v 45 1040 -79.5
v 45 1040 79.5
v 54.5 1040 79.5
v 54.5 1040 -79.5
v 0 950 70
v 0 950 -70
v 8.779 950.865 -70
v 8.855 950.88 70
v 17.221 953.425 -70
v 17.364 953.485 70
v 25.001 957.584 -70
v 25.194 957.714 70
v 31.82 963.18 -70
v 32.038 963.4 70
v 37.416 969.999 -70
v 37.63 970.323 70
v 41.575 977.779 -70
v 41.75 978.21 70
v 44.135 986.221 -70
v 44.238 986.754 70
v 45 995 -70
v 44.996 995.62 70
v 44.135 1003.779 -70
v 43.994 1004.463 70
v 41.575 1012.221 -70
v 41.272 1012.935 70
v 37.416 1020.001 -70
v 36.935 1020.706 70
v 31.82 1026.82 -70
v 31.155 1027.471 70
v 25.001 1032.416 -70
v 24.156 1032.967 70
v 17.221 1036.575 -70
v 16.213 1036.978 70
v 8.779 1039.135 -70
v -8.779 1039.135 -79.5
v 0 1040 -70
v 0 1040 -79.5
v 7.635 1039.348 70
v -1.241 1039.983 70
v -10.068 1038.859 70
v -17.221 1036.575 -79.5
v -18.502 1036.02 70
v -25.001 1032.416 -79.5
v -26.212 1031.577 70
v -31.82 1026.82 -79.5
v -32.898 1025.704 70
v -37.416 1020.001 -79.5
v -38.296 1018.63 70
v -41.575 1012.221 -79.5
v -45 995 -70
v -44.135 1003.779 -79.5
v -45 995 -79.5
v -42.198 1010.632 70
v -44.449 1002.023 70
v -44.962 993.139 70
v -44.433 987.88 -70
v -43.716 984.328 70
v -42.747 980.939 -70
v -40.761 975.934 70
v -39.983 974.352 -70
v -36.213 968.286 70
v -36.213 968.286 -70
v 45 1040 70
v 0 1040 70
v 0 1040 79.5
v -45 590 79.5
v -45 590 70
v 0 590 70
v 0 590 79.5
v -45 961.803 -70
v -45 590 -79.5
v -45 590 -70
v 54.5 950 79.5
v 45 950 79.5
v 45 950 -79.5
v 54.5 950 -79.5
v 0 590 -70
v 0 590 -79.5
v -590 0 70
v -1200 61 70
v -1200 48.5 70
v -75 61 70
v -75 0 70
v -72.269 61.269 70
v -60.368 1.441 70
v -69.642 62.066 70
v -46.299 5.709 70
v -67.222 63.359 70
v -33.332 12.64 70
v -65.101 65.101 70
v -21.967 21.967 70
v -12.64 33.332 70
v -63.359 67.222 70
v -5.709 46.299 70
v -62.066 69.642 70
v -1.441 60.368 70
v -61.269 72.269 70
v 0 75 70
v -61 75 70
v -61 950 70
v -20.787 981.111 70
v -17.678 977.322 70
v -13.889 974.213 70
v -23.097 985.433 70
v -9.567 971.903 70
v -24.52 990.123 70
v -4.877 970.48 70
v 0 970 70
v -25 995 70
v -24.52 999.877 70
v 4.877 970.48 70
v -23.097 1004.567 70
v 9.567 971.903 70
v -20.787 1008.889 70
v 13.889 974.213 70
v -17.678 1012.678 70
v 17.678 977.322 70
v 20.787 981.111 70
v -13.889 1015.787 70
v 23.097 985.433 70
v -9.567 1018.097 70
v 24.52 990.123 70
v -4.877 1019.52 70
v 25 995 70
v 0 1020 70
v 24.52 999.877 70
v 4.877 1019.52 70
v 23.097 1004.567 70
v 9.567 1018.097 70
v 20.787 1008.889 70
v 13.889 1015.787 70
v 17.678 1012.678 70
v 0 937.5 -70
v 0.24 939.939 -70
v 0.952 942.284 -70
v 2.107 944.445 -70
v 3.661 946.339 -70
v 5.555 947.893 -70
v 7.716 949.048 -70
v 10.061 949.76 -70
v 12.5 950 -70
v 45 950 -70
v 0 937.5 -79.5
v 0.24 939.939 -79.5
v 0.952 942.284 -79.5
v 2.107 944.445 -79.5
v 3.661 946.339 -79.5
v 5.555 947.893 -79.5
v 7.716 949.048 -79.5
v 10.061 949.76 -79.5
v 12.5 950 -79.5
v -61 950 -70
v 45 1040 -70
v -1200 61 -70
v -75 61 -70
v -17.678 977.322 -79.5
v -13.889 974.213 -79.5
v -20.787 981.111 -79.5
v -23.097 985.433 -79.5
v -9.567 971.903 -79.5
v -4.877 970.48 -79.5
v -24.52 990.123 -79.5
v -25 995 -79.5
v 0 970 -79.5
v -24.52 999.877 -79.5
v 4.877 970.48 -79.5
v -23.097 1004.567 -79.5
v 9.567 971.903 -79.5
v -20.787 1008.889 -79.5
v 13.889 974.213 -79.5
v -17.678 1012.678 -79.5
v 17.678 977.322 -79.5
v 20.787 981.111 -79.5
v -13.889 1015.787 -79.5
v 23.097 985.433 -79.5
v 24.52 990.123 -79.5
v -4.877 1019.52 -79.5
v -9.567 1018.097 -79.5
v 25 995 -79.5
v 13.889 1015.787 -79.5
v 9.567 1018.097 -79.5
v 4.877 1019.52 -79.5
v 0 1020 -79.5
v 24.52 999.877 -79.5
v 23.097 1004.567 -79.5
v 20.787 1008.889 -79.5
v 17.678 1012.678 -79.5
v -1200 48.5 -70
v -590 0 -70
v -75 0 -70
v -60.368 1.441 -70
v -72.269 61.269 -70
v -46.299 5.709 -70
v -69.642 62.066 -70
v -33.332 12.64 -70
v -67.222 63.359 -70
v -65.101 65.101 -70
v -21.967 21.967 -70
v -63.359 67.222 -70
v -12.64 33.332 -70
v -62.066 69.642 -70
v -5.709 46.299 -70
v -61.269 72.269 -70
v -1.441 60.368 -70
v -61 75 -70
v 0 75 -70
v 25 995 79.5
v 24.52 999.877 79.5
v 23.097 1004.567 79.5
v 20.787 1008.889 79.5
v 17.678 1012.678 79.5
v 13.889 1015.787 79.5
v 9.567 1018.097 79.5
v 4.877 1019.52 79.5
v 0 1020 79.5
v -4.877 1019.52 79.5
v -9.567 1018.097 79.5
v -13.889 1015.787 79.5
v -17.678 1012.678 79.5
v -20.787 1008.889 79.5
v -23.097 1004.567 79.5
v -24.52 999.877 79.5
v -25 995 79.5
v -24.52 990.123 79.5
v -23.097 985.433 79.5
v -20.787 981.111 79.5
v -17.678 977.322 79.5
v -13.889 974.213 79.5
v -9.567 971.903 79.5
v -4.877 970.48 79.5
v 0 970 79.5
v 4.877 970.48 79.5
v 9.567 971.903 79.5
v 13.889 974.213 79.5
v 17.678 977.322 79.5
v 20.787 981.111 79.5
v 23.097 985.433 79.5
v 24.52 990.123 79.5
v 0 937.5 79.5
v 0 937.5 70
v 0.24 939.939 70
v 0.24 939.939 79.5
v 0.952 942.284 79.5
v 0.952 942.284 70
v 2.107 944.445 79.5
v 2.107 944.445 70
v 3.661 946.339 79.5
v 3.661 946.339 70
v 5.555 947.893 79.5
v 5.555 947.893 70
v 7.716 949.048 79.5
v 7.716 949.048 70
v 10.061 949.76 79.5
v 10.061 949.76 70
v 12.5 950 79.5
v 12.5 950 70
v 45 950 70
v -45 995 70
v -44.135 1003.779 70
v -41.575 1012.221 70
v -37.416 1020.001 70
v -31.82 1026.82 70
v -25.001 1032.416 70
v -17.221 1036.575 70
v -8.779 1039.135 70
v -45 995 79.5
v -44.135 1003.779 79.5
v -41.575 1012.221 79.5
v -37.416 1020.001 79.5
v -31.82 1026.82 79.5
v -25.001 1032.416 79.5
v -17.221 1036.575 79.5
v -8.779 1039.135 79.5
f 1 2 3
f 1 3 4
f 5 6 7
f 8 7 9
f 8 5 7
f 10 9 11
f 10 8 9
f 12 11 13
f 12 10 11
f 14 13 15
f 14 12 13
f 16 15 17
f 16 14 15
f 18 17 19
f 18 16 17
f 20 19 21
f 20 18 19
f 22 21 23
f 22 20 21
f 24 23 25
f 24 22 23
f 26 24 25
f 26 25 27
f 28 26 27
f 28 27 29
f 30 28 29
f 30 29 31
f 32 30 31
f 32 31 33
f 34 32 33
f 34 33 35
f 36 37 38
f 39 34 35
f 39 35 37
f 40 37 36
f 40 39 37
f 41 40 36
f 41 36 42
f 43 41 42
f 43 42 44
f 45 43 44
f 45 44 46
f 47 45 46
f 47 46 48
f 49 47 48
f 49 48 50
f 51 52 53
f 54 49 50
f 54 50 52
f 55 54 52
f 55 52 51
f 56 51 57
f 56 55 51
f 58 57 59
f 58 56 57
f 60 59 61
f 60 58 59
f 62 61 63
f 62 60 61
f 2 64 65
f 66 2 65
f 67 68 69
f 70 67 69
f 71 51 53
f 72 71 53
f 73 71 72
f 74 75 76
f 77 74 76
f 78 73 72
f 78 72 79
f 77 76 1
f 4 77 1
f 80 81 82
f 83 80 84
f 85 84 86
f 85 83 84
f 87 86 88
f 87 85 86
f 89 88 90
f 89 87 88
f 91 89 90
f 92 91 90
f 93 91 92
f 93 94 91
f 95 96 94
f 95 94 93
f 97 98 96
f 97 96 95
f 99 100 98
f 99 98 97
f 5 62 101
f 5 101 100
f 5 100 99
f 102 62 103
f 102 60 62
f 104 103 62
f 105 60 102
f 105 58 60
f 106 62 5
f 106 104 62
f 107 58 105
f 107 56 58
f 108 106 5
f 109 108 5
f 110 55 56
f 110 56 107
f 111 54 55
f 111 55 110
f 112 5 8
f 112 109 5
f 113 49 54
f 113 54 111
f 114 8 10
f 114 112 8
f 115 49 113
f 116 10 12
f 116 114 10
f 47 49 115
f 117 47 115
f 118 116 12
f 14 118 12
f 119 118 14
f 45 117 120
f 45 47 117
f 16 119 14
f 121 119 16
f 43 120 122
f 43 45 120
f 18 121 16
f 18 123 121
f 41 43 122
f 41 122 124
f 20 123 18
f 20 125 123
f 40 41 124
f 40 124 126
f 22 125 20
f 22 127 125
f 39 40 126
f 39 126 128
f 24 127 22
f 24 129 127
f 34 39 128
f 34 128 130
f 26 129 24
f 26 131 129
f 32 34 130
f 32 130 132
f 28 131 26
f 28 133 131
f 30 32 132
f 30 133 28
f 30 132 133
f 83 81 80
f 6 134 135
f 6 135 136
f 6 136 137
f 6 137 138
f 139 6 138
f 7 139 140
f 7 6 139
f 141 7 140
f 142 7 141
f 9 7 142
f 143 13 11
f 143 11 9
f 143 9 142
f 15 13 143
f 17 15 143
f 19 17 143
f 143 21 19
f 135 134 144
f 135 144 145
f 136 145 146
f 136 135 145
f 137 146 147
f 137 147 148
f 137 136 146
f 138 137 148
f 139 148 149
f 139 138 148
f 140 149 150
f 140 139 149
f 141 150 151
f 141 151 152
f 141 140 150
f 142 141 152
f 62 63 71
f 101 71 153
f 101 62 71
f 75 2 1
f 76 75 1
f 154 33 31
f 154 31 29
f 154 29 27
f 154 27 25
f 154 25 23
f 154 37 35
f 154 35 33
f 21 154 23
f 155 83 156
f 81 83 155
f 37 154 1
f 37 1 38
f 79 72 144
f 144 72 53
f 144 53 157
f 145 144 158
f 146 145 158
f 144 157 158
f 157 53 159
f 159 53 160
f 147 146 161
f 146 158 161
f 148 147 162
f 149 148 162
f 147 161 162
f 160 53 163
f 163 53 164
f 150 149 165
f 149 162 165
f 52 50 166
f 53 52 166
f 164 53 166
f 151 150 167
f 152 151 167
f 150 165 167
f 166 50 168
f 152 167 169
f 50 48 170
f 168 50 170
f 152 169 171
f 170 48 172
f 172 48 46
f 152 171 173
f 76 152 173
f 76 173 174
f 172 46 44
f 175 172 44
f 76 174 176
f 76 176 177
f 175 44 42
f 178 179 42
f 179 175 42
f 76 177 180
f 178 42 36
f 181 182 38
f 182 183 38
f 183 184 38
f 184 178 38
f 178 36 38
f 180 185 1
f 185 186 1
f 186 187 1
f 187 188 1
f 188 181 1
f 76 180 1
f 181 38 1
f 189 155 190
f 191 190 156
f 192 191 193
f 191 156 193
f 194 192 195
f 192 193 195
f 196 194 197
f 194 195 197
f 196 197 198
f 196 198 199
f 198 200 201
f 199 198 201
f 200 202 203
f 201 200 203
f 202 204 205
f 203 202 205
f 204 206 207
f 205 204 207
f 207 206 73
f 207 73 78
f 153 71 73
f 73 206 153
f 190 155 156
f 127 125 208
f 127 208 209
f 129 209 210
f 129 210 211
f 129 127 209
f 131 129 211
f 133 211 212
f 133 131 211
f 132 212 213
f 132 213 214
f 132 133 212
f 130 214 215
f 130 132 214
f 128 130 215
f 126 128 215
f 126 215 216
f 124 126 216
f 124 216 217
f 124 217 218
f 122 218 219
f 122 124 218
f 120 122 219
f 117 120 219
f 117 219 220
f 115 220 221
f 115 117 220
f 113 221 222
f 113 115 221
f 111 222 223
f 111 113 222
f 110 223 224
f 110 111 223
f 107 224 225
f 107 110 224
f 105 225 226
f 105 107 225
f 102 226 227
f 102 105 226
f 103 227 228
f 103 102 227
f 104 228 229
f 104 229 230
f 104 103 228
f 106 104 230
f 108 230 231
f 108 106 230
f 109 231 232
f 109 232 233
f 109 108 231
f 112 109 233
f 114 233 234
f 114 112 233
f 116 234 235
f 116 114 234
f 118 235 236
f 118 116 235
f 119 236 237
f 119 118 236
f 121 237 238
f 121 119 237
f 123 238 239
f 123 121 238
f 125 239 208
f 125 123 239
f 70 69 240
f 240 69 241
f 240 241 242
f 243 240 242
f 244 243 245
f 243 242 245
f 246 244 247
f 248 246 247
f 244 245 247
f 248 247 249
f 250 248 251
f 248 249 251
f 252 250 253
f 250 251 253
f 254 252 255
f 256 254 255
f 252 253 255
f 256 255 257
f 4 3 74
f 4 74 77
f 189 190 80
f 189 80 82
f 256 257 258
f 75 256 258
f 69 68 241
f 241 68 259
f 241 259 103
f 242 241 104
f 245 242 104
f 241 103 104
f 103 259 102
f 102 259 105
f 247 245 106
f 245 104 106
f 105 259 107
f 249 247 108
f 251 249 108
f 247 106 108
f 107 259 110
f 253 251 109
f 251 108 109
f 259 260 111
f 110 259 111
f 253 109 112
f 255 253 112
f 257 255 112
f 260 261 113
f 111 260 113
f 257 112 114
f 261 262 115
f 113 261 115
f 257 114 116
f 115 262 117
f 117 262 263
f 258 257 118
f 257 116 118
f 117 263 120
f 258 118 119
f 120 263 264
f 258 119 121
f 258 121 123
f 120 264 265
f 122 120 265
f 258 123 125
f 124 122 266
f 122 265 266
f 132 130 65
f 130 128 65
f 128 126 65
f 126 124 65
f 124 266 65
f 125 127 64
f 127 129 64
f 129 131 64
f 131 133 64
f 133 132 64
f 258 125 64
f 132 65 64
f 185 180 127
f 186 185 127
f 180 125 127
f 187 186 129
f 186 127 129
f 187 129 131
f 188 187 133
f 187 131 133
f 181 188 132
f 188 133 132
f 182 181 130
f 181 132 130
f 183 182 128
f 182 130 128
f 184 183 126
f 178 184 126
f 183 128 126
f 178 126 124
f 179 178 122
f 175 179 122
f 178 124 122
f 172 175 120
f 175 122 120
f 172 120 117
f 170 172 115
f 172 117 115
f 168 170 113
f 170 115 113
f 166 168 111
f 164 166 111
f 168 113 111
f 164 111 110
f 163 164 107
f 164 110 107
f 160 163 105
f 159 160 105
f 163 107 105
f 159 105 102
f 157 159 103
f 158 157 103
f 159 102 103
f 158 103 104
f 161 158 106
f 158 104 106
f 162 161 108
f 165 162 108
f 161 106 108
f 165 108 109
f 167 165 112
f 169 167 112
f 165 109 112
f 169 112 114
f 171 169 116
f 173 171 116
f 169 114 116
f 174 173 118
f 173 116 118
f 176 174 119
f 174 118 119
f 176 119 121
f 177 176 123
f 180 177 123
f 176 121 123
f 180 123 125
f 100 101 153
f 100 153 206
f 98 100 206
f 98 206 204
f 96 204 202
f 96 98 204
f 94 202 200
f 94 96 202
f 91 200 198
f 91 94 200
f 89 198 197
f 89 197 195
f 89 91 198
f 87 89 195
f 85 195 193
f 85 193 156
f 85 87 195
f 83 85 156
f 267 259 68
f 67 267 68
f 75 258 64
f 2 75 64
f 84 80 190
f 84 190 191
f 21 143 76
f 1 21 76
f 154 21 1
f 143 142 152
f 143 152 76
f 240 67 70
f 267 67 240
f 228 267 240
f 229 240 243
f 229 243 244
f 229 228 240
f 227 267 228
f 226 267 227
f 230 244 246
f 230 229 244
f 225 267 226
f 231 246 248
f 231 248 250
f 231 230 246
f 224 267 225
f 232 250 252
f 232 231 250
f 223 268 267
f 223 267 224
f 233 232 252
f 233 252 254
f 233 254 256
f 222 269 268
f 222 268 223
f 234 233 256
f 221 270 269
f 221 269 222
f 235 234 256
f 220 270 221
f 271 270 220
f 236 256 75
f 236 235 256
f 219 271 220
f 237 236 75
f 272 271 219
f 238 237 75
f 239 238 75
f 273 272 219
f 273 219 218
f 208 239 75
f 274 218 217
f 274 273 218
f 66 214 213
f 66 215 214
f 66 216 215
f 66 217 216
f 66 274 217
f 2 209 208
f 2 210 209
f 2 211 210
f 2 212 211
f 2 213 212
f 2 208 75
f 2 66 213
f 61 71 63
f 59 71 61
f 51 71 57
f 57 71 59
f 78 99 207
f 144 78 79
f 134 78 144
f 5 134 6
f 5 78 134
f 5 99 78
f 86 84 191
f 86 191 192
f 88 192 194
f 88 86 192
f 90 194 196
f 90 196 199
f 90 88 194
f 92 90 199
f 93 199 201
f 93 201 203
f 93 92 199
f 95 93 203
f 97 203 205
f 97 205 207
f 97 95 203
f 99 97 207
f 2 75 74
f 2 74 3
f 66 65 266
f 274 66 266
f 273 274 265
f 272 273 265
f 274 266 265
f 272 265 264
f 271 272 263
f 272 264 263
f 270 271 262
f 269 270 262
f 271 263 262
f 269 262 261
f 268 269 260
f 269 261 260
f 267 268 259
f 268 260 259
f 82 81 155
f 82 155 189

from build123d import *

# Parameters (mm, degrees)
EXTRUDE_THIN1_DEPTH     = 70
CUT_EXTRUDE1_DEPTH      = 1537.912489376
CUT_EXTRUDE1_DEPTH_BACK = 1537.912489376
SKETCH3_R               = 45
SKETCH3_R_2             = 25
BOSS_EXTRUDE1_DEPTH     = 70
BOSS_EXTRUDE2_DEPTH     = 70
SKETCH5_R               = 45
SKETCH5_R_2             = 25
BOSS_EXTRUDE3_DEPTH     = 9.5
SKETCH7_W               = 159
SKETCH7_H               = 90
BOSS_EXTRUDE5_DEPTH     = 9.5


with BuildPart() as part:
    # Sketch1 → Extrude-Thin1 (new, symmetric)
    with BuildSketch(Plane.XY):
        with BuildLine():
            Line((-1200, 0), (-75, 0))
            ThreePointArc((-75, 0), (-21.966991411, 21.966991411), (0, 75))
            Line((0, 75), (0, 950))
            Line((0, 950), (-61, 950))
            Line((-61, 950), (-61, 75))
            ThreePointArc((-61, 75), (-65.100505063, 65.100505063), (-75, 61))
            Line((-75, 61), (-1200, 61))
            Line((-1200, 61), (-1200, 0))
        make_face()
    extrude(amount=EXTRUDE_THIN1_DEPTH, both=True)

    # Sketch2 → Cut-Extrude1 (cut, two sides: drawn at the far end of the back side and taken through both)
    with BuildSketch(Plane.XY.offset(70).offset(-CUT_EXTRUDE1_DEPTH_BACK)):
        Polygon((-4202.326226889, 287.209544269), (-1200, 48.5), (-590, 0), (2412.326226889, -238.709544269), (1934.907138351, -6243.361998046), (-4679.745315427, -5717.442909508), align=None)
    extrude(amount=CUT_EXTRUDE1_DEPTH + CUT_EXTRUDE1_DEPTH_BACK, mode=Mode.SUBTRACT)


with BuildPart() as body_2:
    # Sketch3 → Boss-Extrude1 (new, symmetric)
    with BuildSketch(Plane.XY):
        with Locations((0, 995)):
            Circle(SKETCH3_R)
        with Locations((0, 995)):
            Circle(SKETCH3_R_2, mode=Mode.SUBTRACT)
    extrude(amount=BOSS_EXTRUDE1_DEPTH, both=True)


with BuildPart() as body_3:
    # Sketch4 → Boss-Extrude2 (new, symmetric)
    with BuildSketch(Plane.XY):
        with BuildLine():
            Line((-36.212585863, 968.285797314), (-61, 950))
            Line((-61, 950), (0, 950))
            ThreePointArc((0, 950), (-20.283748164, 954.830738612), (-36.212585863, 968.285797314))
        make_face()
    extrude(amount=BOSS_EXTRUDE2_DEPTH, both=True)


with BuildPart() as body_4:
    # Sketch5 → Boss-Extrude3 (new body)
    # profile 1 of 3: a face of its own
    with BuildSketch(Plane.XY.offset(70)):
        with Locations((0, 995)):
            Circle(SKETCH5_R)
        with Locations((0, 995)):
            Circle(SKETCH5_R_2, mode=Mode.SUBTRACT)
    # profile 2 of 3: a face of its own
    with BuildSketch(Plane.XY.offset(70)):
        with BuildLine():
            Line((45, 1040), (0, 1040))
            ThreePointArc((0, 1040), (31.819805153, 1026.819805153), (45, 995))
            Line((45, 995), (45, 1040))
        make_face()
    # profile 3 of 3: a face of its own
    with BuildSketch(Plane.XY.offset(70)):
        with BuildLine():
            ThreePointArc((45, 995), (0, 950), (-45, 995))
            Line((-45, 995), (-45, 590))
            Line((-45, 590), (0, 590))
            Line((0, 590), (0, 937.5))
            ThreePointArc((0, 937.5), (3.661165235, 946.338834765), (12.5, 950))
            Line((12.5, 950), (45, 950))
            Line((45, 950), (45, 995))
        make_face()
    boss_extrude3 = extrude(amount=BOSS_EXTRUDE3_DEPTH)


with BuildPart() as part_1:
    add(part.part)

    add(body_2.part)  # Mirror1 merges body 2

    add(body_3.part)  # Mirror1 merges body 3
    # Mirror1: Boss-Extrude3 across plane
    add(boss_extrude3.mirror(Plane.XY))


with BuildPart() as body_3_2:
    # Sketch7 → Boss-Extrude5 (new body)
    with BuildSketch(Plane(origin=(45, 0, 0), x_dir=(0, 0, -1), z_dir=(1, 0, 0))):
        with Locations((0, 995)):
            Rectangle(SKETCH7_W, SKETCH7_H)
    extrude(amount=BOSS_EXTRUDE5_DEPTH)


solid = Compound([body_4.part, part_1.part, body_3_2.part])
